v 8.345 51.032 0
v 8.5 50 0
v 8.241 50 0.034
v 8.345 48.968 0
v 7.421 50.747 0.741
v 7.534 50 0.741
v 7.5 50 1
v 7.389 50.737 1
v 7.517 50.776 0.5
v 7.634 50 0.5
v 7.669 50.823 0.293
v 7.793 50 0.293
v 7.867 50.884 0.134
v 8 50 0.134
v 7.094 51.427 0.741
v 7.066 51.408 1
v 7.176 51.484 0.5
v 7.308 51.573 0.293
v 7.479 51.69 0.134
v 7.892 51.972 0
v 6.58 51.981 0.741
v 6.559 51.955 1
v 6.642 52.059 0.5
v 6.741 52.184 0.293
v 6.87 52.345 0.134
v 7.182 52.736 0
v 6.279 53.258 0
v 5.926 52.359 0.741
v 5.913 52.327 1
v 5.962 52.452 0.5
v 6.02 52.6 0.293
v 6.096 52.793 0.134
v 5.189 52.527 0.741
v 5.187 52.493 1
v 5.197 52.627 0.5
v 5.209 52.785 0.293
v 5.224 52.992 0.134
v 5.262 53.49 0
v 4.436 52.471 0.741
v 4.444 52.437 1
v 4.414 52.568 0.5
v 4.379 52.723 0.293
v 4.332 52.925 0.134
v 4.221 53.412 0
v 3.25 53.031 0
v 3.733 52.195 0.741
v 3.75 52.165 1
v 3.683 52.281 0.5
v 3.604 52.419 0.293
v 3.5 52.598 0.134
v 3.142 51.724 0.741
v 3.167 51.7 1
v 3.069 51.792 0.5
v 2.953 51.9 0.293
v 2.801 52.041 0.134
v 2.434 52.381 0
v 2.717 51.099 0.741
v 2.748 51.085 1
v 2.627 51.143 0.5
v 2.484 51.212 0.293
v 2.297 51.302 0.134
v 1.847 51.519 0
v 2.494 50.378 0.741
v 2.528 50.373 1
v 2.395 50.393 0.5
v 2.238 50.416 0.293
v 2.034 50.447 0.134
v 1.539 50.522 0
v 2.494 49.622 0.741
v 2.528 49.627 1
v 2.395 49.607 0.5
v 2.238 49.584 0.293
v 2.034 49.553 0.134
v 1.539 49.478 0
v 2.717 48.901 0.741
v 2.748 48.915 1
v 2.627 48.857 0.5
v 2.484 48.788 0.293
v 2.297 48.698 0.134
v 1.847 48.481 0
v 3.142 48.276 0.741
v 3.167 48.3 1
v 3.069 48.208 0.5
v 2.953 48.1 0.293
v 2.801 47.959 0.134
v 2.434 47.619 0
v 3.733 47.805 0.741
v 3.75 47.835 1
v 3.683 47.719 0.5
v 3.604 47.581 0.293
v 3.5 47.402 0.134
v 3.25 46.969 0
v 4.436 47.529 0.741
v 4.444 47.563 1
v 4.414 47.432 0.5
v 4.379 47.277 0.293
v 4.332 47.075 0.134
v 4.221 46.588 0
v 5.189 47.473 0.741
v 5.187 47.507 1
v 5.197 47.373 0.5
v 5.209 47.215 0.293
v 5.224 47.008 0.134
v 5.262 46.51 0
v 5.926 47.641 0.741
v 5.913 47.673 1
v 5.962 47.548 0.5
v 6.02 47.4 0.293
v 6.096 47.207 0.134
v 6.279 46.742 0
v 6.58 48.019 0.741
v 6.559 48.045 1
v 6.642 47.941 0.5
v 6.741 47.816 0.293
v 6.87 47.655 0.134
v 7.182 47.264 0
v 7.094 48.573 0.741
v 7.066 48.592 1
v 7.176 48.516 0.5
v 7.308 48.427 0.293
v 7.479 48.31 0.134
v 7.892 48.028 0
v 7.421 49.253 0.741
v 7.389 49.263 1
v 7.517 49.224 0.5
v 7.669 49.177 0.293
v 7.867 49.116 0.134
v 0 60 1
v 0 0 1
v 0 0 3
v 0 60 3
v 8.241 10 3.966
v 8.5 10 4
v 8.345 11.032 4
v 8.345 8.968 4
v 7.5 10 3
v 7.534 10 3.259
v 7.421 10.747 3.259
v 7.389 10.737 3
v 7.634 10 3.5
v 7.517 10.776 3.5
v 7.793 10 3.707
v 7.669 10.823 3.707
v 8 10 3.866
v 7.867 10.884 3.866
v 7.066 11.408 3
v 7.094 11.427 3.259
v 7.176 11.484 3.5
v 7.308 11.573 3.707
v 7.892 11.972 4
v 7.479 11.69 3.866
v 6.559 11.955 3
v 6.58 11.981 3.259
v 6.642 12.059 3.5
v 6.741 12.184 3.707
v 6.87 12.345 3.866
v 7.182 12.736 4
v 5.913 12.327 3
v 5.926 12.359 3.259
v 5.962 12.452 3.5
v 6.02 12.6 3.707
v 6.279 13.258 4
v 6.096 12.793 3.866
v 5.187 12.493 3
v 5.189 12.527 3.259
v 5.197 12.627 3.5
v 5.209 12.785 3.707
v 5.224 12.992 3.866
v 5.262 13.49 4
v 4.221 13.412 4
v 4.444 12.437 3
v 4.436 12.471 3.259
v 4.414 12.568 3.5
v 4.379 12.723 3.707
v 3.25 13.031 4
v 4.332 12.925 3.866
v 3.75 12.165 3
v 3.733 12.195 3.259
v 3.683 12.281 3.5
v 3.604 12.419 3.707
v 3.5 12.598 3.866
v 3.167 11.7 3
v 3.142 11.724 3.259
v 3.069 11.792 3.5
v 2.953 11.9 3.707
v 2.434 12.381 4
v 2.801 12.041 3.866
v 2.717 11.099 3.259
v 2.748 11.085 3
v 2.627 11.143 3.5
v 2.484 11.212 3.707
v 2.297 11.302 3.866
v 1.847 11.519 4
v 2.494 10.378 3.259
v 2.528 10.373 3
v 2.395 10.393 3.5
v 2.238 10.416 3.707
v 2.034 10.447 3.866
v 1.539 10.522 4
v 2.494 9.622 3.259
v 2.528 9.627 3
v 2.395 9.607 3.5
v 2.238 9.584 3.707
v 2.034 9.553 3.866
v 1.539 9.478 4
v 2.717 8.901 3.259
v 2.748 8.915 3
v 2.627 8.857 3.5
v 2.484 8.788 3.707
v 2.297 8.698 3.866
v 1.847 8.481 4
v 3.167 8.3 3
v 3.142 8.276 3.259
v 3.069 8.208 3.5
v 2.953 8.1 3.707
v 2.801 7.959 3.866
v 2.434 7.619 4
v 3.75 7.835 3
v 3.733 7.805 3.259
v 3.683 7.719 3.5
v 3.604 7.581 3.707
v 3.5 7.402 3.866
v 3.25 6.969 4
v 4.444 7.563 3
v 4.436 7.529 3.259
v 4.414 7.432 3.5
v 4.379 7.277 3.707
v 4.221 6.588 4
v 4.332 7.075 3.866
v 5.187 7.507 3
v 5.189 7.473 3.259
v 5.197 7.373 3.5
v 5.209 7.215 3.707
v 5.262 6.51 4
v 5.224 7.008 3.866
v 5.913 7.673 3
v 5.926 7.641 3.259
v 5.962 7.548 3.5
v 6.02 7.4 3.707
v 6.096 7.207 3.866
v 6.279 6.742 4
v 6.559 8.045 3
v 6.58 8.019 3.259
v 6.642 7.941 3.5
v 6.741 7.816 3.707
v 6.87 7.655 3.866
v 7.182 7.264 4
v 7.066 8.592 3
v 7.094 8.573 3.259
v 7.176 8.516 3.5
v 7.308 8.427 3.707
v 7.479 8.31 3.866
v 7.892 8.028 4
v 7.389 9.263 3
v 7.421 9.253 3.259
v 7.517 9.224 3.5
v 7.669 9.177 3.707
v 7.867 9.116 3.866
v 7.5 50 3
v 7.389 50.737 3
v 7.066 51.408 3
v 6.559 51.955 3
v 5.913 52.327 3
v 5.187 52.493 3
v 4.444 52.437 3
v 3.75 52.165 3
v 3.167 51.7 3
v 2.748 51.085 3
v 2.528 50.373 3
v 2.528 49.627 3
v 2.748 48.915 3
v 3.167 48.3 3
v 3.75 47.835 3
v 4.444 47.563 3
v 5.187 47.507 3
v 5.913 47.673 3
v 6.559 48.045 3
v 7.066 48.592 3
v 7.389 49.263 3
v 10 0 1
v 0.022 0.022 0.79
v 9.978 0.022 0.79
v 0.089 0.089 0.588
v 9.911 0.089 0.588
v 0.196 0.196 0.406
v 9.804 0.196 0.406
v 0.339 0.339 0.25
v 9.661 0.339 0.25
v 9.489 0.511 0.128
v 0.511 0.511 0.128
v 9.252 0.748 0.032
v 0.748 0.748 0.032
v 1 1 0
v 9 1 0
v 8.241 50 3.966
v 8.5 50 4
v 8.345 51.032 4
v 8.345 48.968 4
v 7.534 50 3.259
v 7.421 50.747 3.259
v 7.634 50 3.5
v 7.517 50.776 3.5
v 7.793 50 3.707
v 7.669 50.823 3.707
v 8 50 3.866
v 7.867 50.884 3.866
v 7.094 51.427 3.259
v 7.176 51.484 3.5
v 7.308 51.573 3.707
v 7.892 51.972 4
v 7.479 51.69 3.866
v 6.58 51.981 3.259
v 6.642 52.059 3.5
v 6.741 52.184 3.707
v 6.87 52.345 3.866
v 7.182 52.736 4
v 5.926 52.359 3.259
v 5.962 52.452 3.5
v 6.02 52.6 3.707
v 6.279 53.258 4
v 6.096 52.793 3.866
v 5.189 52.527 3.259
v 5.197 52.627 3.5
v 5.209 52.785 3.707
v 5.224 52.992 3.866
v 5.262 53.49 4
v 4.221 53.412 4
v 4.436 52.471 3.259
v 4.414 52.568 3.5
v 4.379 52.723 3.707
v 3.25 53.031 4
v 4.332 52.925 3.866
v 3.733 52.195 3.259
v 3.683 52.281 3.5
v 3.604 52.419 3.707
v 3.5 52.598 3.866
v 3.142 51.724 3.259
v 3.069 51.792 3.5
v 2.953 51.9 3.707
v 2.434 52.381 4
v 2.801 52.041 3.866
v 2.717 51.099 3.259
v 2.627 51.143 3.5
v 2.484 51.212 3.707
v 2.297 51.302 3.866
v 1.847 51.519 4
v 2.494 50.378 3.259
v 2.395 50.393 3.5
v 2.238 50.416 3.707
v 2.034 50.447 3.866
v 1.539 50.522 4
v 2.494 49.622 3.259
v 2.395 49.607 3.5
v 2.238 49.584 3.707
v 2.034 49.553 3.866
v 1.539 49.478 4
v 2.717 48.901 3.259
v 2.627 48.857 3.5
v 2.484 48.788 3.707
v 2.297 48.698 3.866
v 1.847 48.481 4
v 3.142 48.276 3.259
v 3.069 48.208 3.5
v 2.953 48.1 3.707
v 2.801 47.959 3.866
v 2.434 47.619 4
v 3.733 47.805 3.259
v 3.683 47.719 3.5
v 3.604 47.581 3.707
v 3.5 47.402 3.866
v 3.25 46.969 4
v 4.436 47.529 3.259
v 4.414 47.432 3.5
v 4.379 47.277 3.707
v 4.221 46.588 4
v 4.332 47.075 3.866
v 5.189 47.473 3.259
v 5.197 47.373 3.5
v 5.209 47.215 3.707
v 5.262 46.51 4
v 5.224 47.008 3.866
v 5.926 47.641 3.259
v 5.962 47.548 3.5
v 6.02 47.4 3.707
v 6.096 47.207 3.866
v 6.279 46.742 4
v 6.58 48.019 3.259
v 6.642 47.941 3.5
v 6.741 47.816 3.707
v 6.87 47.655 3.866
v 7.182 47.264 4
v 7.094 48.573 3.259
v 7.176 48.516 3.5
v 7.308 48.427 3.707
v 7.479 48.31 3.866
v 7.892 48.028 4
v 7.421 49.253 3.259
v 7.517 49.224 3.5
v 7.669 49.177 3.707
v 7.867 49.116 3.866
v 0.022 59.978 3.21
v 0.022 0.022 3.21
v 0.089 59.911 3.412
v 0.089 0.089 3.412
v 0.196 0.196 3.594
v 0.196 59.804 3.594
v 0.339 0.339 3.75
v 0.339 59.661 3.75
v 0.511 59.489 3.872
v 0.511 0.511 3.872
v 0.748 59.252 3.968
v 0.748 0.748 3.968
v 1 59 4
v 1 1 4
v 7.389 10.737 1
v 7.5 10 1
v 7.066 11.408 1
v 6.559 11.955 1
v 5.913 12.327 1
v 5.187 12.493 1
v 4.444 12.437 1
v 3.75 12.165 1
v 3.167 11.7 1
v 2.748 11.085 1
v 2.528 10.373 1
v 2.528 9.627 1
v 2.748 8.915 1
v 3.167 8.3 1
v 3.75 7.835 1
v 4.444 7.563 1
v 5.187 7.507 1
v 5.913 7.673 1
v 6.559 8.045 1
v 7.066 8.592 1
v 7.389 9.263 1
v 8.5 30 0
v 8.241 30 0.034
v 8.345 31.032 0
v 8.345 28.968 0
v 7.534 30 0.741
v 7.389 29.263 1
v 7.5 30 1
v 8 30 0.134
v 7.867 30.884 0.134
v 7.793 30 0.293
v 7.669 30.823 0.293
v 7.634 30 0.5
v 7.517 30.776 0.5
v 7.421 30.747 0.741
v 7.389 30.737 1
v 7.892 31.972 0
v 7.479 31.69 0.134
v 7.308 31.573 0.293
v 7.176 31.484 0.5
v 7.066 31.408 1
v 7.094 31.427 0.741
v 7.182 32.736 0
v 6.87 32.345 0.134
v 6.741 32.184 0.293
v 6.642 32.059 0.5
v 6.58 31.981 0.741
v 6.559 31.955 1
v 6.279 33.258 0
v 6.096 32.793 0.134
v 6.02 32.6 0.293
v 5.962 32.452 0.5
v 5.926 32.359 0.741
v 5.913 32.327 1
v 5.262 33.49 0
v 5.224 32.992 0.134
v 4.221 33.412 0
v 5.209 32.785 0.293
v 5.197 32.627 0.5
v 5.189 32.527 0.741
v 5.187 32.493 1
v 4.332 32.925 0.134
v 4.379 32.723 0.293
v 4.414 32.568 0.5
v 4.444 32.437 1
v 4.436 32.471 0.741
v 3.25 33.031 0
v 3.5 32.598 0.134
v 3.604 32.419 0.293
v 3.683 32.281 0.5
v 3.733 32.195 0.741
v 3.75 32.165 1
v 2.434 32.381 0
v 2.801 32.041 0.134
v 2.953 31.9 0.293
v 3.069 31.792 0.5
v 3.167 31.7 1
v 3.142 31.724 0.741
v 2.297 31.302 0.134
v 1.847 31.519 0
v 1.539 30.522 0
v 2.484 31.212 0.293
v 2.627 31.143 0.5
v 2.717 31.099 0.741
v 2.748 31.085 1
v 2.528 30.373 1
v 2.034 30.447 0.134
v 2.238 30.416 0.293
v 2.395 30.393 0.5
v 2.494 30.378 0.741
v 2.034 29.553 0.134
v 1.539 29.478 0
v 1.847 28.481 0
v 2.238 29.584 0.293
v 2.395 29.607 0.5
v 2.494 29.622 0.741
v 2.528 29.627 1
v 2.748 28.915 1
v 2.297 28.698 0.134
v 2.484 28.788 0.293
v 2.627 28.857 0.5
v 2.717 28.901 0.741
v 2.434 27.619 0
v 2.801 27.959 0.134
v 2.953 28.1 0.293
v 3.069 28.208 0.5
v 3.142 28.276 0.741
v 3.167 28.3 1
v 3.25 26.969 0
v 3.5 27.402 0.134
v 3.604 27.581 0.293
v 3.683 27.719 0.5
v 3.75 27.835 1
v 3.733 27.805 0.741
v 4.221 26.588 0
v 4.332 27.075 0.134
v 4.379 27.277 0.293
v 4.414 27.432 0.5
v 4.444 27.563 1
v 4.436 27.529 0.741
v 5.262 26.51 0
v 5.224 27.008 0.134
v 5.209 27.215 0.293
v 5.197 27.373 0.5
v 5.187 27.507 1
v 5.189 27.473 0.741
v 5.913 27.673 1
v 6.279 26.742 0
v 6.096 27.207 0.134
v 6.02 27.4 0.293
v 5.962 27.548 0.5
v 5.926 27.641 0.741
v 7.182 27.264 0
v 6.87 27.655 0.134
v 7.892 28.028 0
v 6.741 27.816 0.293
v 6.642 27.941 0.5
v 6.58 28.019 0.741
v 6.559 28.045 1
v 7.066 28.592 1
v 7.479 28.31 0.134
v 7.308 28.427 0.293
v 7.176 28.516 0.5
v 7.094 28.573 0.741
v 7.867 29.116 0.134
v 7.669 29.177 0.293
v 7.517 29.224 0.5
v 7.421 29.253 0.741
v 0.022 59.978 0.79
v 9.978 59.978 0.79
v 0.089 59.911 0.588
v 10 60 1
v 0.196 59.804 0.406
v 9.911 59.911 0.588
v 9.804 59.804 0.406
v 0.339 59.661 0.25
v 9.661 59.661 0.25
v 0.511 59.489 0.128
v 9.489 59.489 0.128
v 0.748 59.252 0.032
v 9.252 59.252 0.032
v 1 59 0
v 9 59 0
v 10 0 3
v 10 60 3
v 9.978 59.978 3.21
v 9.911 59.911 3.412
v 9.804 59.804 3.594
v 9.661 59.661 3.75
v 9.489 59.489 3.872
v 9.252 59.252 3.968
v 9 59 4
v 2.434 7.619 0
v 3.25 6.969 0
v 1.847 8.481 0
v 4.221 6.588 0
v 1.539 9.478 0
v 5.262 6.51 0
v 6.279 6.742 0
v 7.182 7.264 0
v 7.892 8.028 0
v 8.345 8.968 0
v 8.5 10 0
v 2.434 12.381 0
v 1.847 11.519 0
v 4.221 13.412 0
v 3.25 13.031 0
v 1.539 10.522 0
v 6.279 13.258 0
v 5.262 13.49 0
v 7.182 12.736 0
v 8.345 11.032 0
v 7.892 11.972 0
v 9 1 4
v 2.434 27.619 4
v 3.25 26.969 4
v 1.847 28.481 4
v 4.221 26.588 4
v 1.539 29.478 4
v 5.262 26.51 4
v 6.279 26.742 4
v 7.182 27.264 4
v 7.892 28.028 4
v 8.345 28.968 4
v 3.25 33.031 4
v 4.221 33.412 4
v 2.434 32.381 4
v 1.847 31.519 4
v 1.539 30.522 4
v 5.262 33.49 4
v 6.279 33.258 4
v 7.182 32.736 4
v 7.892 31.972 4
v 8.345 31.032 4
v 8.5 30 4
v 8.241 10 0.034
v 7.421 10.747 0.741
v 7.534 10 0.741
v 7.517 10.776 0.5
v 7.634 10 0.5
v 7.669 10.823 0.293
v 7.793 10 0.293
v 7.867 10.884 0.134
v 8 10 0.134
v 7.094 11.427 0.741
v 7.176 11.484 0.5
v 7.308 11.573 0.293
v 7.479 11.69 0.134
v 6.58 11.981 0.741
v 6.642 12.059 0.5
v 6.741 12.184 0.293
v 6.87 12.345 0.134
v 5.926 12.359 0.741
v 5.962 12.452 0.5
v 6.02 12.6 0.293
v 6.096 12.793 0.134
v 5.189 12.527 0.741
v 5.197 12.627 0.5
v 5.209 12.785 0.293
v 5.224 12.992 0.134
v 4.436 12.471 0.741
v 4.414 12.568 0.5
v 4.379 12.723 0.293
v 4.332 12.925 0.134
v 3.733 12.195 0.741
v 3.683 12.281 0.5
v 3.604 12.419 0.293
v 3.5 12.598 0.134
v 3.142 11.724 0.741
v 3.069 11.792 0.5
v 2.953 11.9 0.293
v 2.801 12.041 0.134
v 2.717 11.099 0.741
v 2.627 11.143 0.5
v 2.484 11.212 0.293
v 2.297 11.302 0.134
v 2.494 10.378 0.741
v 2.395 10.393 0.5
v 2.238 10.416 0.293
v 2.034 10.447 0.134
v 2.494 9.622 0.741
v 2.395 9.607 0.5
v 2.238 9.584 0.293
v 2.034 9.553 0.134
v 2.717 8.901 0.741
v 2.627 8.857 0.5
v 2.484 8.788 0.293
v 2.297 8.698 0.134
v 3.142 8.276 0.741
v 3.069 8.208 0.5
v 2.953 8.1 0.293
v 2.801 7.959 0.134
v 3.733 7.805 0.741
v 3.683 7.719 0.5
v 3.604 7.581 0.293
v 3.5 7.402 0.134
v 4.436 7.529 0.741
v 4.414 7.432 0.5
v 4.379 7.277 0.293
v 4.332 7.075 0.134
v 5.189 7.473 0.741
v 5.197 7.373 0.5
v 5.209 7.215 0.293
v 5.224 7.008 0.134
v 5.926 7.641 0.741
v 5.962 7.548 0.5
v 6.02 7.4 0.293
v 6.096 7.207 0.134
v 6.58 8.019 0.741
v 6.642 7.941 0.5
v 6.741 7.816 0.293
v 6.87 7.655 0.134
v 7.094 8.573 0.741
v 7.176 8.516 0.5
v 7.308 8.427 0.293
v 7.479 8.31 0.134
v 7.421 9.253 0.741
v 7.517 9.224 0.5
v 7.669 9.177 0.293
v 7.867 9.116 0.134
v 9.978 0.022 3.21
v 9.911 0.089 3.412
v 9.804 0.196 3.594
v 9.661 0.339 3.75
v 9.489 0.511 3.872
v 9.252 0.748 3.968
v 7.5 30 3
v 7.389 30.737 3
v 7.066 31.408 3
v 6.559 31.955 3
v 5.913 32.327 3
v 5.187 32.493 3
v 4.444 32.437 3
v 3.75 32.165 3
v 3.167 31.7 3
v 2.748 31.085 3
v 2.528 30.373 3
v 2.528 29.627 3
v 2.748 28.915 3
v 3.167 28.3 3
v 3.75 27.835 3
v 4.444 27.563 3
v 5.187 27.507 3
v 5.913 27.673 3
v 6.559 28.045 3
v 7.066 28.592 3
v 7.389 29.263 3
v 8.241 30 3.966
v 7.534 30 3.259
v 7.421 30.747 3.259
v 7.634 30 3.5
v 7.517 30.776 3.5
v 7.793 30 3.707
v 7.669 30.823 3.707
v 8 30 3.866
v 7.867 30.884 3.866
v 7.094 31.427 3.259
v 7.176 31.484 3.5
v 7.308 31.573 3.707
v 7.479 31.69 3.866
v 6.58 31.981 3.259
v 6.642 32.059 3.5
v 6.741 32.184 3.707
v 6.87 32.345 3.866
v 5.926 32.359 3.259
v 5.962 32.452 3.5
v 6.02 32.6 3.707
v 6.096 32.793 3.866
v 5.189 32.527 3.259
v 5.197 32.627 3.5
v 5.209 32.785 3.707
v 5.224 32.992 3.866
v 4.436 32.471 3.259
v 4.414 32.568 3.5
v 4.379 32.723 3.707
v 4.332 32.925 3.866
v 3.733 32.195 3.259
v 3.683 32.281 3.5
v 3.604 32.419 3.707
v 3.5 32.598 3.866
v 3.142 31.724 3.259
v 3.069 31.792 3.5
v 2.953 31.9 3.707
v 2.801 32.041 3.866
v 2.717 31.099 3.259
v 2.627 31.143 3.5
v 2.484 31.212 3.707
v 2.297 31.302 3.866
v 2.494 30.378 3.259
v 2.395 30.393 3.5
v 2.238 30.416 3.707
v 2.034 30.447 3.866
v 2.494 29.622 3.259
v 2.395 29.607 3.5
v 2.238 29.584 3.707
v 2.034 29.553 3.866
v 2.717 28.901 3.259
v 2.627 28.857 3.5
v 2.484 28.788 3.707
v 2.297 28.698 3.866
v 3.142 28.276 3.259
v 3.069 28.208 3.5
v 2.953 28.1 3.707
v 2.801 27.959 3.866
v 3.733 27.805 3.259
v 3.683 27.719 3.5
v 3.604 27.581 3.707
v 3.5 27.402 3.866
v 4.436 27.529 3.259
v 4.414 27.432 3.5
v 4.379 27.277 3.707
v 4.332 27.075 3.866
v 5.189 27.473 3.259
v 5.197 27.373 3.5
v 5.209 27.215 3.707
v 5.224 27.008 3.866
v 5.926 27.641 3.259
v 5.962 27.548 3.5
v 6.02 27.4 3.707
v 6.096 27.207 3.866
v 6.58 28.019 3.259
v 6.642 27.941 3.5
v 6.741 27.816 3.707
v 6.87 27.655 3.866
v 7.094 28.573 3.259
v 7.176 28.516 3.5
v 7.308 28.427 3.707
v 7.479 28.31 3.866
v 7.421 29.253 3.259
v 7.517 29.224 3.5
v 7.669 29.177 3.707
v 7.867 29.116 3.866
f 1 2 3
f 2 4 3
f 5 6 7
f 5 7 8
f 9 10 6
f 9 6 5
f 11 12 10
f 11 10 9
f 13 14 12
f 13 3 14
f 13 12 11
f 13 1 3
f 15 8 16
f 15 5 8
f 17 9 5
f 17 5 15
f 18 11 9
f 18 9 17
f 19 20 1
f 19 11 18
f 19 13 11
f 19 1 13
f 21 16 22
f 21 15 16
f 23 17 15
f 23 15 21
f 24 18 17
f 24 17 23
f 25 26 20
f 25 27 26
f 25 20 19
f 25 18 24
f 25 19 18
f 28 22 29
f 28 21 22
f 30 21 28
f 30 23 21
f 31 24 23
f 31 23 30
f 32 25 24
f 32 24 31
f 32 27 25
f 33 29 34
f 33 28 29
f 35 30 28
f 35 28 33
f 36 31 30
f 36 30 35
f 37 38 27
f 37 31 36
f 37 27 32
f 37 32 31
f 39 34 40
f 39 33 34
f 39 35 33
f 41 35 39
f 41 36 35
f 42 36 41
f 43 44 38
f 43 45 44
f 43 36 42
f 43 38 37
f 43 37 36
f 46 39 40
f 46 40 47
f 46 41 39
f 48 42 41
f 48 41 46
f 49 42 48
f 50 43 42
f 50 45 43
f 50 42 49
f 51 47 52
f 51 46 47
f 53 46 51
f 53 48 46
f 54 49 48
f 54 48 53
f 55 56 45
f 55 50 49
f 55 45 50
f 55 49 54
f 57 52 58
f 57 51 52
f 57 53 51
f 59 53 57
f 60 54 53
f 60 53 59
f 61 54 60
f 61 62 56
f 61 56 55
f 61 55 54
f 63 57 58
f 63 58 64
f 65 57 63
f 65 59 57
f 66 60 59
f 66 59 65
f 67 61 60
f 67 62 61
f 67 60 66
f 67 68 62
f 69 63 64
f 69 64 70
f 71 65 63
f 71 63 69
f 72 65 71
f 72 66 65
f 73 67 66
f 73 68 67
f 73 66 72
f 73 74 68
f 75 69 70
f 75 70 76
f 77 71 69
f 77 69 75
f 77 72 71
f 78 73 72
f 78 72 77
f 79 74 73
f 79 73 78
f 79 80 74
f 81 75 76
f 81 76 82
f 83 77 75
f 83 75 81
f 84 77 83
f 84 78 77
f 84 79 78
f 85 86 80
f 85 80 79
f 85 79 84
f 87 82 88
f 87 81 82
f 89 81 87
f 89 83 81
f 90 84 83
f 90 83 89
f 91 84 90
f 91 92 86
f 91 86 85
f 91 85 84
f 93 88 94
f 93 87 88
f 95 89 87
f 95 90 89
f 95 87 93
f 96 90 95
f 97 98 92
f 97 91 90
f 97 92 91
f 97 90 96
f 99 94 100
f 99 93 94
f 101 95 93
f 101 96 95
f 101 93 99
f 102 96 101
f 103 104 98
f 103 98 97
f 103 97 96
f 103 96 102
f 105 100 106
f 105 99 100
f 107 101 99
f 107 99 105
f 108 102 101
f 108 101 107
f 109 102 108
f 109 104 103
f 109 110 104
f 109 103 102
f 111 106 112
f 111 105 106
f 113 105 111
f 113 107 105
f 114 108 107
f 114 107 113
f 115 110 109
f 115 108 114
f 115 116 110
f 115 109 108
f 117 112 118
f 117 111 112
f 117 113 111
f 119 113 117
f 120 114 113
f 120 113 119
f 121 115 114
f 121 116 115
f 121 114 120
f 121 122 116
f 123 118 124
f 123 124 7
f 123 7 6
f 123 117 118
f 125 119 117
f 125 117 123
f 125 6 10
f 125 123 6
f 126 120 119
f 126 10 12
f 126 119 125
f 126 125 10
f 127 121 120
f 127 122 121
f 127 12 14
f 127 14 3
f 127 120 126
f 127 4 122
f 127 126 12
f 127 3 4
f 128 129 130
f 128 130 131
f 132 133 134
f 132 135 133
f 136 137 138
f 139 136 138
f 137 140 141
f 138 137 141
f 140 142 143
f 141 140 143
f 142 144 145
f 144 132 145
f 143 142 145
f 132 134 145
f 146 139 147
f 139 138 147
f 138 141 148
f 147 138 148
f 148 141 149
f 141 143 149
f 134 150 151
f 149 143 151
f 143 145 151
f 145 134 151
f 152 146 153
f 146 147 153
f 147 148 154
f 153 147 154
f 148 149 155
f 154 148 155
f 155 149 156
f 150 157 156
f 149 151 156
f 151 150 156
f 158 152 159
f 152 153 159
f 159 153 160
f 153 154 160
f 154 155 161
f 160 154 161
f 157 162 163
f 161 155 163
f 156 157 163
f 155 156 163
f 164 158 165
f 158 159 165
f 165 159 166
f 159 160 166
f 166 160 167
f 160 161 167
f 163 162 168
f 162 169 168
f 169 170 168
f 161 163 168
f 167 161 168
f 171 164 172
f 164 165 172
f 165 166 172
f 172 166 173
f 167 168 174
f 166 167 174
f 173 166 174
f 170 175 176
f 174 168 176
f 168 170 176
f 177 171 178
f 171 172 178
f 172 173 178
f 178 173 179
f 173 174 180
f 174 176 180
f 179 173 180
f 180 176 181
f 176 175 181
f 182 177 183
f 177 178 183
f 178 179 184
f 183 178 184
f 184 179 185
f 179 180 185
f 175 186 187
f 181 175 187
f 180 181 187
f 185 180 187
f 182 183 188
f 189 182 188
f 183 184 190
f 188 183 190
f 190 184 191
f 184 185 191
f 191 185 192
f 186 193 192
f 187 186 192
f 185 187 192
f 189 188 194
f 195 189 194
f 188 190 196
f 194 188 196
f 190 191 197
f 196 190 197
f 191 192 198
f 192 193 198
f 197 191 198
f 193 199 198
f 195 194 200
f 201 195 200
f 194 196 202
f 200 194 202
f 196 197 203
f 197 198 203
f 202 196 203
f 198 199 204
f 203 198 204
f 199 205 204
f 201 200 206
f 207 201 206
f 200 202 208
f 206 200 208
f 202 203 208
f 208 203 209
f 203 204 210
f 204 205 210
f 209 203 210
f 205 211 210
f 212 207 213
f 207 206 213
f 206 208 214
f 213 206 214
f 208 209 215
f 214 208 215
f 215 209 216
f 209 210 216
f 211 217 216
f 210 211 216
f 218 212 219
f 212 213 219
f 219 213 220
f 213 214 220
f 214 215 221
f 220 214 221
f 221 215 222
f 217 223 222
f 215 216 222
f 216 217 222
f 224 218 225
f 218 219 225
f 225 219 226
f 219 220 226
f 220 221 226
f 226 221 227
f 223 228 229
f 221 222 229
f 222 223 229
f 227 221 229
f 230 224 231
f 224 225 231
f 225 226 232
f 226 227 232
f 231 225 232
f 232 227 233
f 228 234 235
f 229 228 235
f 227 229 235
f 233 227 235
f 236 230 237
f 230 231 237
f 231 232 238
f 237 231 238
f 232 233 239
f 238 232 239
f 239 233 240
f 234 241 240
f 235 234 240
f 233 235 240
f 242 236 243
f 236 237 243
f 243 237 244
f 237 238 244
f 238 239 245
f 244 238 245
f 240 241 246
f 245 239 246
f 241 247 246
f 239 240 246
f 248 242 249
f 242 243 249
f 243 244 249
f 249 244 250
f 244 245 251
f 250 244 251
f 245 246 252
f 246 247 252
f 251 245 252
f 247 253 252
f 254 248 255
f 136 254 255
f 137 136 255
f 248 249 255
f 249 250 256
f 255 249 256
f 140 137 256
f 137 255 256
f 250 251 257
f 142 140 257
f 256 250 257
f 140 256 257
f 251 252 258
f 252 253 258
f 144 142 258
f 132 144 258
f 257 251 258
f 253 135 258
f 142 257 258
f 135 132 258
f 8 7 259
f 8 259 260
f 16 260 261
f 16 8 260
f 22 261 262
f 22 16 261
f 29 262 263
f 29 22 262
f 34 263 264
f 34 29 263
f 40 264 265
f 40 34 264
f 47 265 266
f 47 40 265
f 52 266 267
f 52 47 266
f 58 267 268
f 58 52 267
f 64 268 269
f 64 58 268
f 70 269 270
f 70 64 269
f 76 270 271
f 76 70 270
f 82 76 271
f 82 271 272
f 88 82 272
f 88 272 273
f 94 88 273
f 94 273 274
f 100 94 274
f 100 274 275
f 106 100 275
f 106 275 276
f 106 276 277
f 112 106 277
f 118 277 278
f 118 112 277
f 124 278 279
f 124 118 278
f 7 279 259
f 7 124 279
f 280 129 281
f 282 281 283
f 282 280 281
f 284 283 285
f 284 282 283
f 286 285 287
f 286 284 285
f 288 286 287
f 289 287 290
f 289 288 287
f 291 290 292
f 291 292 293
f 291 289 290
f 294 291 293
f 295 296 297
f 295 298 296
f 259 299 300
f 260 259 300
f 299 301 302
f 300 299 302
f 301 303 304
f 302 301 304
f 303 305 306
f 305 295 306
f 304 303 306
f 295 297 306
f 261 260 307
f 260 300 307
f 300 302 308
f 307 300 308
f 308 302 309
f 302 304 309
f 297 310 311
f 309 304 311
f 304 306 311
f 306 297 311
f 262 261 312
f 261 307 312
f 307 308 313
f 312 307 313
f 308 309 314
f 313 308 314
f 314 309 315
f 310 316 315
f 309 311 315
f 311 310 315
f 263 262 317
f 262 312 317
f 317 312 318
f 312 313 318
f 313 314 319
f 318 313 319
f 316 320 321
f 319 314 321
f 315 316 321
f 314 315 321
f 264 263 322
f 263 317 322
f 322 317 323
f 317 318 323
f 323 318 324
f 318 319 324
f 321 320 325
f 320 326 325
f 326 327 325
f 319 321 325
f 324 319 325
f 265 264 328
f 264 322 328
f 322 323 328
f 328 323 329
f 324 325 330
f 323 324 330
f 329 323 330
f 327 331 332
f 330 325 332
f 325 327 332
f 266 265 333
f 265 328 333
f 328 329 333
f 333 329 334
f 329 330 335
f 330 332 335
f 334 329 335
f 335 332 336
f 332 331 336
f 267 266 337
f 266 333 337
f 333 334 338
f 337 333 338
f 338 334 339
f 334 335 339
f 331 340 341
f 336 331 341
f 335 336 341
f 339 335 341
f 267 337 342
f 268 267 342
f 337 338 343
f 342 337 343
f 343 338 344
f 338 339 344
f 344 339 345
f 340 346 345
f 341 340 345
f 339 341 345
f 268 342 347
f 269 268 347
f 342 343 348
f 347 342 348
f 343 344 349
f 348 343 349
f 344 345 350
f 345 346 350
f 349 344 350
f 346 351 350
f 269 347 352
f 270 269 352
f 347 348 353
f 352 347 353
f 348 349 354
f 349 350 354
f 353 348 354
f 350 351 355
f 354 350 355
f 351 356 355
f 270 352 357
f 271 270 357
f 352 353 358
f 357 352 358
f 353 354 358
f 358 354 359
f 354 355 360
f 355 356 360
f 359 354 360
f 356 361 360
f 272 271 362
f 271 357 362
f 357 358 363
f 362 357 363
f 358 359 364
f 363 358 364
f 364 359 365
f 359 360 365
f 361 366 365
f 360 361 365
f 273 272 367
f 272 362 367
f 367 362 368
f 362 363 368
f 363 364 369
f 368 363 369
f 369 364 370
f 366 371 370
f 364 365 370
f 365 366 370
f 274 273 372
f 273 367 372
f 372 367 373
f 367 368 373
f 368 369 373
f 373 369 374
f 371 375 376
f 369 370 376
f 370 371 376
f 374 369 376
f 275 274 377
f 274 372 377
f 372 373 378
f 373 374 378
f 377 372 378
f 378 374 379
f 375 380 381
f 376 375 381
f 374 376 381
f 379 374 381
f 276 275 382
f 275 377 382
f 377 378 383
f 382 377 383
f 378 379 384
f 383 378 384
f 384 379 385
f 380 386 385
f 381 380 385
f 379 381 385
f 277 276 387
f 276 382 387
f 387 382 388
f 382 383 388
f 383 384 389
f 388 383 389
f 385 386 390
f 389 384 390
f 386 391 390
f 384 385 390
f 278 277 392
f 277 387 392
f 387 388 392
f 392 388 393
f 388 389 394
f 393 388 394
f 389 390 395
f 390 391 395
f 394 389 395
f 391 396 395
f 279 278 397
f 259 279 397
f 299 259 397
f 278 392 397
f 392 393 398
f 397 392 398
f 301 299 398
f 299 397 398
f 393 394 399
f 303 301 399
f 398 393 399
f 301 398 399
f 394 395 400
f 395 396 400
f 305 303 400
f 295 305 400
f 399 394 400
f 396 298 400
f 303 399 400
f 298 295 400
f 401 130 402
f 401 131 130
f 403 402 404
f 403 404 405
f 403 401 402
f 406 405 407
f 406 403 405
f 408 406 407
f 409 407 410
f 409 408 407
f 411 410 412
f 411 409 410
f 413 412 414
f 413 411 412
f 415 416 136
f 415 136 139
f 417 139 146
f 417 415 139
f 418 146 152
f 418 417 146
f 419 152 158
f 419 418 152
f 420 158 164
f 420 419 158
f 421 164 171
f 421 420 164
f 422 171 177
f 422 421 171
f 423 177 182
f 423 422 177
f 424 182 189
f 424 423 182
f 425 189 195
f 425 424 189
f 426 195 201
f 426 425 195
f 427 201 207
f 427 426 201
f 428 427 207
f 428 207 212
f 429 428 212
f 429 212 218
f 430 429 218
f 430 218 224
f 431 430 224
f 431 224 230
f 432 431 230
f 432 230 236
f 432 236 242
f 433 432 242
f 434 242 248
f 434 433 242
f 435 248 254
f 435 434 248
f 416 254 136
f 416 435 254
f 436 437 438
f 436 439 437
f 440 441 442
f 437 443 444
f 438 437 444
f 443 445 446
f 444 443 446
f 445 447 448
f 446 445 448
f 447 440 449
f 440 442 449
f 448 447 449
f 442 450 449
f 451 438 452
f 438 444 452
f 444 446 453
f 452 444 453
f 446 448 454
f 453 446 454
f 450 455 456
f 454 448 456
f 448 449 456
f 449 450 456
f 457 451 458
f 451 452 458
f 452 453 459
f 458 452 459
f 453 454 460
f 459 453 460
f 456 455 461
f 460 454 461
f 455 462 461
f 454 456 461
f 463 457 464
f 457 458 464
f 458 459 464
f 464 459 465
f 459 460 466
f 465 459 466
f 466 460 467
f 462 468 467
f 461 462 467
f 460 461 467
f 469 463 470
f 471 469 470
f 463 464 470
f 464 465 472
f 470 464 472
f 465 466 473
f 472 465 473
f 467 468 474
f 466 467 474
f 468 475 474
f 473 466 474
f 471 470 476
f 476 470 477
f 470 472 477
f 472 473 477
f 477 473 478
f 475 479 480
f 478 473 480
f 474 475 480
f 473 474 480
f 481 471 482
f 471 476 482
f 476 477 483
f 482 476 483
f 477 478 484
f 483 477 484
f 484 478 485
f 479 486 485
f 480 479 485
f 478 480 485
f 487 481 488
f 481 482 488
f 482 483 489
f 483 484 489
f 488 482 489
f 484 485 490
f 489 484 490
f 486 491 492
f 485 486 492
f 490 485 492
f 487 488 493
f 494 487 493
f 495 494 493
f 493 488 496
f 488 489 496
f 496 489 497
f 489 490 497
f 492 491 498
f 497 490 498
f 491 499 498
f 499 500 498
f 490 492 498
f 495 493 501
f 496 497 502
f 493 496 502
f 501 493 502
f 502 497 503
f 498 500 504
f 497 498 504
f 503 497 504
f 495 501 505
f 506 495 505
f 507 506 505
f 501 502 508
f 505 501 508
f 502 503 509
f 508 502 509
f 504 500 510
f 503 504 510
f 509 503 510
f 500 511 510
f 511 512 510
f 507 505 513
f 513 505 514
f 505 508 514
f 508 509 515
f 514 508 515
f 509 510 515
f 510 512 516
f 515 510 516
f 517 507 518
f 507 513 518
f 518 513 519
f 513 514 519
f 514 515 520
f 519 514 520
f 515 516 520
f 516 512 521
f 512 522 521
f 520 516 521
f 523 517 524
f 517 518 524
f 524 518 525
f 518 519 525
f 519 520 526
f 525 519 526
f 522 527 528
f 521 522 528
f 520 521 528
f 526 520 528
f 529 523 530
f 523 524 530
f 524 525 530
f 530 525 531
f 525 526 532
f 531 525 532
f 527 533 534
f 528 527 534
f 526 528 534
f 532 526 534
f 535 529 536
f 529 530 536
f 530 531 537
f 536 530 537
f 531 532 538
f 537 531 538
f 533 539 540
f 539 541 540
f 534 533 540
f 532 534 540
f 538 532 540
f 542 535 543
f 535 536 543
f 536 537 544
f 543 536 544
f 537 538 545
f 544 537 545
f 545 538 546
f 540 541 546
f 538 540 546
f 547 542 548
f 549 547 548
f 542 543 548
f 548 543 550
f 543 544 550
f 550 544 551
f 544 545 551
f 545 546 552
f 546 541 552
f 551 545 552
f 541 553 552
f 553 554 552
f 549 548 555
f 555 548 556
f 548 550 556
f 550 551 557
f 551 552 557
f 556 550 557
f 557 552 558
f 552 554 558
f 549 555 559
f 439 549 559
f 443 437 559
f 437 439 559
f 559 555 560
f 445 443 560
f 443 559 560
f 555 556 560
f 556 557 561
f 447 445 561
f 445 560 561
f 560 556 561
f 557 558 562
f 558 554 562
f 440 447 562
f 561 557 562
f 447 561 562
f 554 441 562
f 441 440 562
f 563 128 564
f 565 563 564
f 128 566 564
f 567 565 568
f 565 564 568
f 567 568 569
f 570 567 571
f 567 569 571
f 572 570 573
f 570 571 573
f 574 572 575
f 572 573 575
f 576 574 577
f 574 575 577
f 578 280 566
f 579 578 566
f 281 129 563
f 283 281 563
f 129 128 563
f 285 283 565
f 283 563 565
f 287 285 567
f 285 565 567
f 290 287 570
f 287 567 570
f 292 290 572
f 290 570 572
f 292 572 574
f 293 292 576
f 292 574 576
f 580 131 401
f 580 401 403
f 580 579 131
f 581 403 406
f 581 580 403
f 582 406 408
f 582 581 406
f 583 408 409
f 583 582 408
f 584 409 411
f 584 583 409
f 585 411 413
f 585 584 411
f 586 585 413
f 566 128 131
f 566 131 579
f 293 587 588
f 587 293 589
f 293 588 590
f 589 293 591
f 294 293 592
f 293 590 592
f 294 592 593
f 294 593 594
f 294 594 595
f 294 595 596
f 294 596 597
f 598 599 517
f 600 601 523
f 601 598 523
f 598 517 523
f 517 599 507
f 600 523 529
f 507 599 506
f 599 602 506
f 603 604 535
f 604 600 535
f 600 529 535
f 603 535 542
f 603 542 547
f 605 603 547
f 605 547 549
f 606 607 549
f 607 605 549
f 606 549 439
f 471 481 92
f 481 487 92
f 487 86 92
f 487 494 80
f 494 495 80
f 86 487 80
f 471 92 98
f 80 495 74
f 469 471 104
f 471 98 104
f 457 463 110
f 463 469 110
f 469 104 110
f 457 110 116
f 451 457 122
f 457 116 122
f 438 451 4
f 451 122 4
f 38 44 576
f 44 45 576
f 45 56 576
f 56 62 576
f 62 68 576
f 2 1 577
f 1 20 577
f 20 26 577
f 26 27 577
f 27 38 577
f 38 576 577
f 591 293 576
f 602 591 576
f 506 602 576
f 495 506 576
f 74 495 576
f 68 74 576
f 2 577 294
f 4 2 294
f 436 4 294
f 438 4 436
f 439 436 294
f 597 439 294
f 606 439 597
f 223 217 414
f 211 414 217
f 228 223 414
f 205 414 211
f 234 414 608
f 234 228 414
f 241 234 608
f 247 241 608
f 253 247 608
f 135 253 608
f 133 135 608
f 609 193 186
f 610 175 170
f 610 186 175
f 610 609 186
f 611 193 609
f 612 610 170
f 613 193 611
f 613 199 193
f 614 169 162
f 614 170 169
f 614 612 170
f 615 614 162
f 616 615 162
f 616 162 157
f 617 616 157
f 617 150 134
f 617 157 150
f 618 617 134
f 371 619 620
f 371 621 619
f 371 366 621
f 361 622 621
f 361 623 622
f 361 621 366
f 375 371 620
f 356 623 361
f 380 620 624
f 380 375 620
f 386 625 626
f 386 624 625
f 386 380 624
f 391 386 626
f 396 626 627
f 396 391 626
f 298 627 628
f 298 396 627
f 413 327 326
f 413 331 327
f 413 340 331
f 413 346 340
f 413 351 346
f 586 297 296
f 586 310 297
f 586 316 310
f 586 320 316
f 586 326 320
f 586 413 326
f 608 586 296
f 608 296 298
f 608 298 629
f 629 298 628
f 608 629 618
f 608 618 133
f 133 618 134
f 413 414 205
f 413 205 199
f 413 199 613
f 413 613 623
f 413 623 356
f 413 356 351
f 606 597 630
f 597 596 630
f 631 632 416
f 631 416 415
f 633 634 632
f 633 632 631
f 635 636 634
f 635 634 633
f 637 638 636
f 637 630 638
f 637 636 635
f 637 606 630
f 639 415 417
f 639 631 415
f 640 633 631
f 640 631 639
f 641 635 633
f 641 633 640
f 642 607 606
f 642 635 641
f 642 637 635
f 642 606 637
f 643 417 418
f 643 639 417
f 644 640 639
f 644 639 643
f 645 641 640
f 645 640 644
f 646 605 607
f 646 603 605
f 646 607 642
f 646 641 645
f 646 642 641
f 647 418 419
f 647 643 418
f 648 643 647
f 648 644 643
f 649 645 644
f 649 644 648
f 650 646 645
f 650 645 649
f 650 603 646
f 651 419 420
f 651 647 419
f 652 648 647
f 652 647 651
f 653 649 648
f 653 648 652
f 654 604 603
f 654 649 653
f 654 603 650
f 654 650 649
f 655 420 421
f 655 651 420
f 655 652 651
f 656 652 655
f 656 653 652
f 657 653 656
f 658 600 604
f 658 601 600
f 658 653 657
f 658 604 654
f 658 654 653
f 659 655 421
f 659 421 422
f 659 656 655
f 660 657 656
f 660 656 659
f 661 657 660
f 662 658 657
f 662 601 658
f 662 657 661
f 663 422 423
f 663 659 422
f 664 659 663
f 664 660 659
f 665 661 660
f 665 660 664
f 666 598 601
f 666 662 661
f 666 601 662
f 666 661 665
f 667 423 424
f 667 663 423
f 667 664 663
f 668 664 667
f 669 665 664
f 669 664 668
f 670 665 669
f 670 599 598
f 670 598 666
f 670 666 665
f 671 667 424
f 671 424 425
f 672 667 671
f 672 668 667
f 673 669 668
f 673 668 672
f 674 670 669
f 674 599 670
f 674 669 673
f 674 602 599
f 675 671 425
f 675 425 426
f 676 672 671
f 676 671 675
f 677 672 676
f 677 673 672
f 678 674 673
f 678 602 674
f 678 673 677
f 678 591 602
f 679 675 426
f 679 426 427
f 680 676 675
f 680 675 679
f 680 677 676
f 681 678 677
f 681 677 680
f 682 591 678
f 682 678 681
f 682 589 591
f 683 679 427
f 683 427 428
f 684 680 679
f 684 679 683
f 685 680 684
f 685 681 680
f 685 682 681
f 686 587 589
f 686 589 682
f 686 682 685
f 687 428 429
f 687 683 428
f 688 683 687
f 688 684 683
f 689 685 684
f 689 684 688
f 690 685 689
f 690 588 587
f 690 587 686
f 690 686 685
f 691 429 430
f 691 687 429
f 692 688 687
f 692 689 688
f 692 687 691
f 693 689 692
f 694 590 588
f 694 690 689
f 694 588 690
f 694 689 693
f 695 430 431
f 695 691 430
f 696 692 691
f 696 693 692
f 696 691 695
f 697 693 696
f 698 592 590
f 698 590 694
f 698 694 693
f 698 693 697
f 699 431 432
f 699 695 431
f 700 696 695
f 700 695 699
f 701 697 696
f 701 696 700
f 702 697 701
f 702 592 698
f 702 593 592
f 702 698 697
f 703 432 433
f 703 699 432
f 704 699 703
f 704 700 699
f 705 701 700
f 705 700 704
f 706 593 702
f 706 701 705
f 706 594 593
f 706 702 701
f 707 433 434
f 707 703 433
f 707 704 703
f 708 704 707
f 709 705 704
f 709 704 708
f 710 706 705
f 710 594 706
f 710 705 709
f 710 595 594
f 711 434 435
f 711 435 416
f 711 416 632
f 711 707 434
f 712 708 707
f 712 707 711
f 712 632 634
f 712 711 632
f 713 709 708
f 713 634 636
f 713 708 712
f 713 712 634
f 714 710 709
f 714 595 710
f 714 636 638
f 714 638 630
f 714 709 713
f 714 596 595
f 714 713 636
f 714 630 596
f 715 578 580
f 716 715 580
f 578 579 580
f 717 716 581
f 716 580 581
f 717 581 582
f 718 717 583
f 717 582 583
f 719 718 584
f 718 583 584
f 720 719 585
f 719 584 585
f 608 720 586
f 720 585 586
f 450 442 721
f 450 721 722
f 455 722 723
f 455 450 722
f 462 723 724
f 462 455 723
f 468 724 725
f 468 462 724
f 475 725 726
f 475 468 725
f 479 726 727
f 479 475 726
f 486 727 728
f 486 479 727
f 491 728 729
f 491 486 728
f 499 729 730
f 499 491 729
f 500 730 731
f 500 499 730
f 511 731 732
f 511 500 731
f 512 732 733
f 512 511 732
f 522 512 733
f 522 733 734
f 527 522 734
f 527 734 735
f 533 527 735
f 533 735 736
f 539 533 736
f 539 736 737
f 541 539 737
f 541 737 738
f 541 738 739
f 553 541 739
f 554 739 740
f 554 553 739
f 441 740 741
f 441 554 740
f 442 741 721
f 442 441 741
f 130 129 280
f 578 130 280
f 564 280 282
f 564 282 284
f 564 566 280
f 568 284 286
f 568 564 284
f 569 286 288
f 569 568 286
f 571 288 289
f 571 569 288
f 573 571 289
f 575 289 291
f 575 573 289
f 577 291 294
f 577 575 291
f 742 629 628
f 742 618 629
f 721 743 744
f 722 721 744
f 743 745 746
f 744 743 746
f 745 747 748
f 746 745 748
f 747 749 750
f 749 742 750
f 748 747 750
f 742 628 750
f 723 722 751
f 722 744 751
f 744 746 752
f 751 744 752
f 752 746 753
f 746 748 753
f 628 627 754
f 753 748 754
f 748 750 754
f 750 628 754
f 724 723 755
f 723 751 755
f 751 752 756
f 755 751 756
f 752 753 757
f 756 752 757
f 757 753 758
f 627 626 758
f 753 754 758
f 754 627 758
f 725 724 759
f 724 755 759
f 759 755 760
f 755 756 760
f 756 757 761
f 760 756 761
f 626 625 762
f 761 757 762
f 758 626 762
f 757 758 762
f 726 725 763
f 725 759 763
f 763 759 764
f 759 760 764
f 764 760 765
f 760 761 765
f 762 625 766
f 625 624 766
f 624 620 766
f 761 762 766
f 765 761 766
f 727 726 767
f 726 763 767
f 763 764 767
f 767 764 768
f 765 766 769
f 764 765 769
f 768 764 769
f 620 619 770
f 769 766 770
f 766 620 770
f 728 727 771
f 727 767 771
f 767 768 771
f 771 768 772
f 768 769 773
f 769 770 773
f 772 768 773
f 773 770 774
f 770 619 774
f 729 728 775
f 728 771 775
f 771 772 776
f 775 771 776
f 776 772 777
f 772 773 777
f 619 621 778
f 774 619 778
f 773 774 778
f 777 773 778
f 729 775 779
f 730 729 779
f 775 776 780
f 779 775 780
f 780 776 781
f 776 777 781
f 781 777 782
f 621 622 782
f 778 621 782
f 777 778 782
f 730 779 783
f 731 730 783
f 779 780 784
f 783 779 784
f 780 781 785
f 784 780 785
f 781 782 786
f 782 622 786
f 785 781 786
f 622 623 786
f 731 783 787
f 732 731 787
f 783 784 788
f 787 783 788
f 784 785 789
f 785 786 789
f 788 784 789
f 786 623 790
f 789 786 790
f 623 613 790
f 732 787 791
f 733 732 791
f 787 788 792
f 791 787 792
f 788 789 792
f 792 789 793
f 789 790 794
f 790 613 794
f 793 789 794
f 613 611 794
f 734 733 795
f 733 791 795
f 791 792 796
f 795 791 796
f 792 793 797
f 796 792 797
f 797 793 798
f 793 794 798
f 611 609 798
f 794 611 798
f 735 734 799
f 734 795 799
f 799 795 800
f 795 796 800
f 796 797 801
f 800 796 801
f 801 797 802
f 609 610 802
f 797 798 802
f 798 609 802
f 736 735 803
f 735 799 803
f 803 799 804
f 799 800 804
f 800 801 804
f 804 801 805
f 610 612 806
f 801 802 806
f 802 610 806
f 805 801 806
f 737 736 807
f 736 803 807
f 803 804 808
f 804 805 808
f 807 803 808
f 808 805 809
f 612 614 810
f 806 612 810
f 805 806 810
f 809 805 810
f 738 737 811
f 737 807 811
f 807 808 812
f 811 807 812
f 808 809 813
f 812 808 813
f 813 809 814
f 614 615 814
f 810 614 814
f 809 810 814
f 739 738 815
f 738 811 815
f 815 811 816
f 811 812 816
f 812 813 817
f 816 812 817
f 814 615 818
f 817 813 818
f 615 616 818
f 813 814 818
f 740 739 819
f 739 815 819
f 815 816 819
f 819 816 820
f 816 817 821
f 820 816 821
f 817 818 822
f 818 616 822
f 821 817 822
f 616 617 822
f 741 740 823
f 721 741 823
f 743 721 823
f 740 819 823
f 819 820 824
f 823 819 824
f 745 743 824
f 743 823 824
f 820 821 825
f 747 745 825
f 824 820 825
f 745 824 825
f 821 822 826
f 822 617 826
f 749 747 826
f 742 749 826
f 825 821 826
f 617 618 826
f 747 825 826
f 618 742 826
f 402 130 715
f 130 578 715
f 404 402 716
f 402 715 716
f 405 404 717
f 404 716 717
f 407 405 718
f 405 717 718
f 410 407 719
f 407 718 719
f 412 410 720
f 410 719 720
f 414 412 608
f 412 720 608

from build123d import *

# Parameters (mm, degrees)
SKETCH2_W           = 10
SKETCH2_H           = 60
SKETCH2_R           = 2.5
BOSS_EXTRUDE1_DEPTH = 4
FILLET1_R           = 1
FILLET2_R           = 1


with BuildPart() as part:
    # Sketch2 → Boss-Extrude1 (new body)
    with BuildSketch(Plane.XY):
        with Locations((5, 30)):
            Rectangle(SKETCH2_W, SKETCH2_H)
        with Locations((5, 50)):
            Circle(SKETCH2_R, mode=Mode.SUBTRACT)
        with Locations((5, 10)):
            Circle(SKETCH2_R, mode=Mode.SUBTRACT)
        with Locations((5, 30)):
            Circle(SKETCH2_R, mode=Mode.SUBTRACT)
    extrude(amount=BOSS_EXTRUDE1_DEPTH)

    # Fillet1
    fillet1_edges = [part.edges().sort_by_distance(p)[0] for p in [
        (2.5, 30, 4),
        (10, 30, 4),
        (2.5, 50, 0),
        (2.5, 50, 4),
        (5, 60, 4),
        (2.5, 10, 0),
        (2.5, 10, 4),
        (0, 30, 4),
        (5, 60, 0),
        (10, 30, 0),
        (5, 0, 0),
        (0, 30, 0),
        (5, 0, 4),
    ]]
    fillet(fillet1_edges, radius=FILLET1_R)

    # Fillet2
    fillet2_edges = [part.edges().sort_by_distance(p)[0] for p in [
        (2.5, 30, 0),
    ]]
    fillet(fillet2_edges, radius=FILLET2_R)


solid = part.part
